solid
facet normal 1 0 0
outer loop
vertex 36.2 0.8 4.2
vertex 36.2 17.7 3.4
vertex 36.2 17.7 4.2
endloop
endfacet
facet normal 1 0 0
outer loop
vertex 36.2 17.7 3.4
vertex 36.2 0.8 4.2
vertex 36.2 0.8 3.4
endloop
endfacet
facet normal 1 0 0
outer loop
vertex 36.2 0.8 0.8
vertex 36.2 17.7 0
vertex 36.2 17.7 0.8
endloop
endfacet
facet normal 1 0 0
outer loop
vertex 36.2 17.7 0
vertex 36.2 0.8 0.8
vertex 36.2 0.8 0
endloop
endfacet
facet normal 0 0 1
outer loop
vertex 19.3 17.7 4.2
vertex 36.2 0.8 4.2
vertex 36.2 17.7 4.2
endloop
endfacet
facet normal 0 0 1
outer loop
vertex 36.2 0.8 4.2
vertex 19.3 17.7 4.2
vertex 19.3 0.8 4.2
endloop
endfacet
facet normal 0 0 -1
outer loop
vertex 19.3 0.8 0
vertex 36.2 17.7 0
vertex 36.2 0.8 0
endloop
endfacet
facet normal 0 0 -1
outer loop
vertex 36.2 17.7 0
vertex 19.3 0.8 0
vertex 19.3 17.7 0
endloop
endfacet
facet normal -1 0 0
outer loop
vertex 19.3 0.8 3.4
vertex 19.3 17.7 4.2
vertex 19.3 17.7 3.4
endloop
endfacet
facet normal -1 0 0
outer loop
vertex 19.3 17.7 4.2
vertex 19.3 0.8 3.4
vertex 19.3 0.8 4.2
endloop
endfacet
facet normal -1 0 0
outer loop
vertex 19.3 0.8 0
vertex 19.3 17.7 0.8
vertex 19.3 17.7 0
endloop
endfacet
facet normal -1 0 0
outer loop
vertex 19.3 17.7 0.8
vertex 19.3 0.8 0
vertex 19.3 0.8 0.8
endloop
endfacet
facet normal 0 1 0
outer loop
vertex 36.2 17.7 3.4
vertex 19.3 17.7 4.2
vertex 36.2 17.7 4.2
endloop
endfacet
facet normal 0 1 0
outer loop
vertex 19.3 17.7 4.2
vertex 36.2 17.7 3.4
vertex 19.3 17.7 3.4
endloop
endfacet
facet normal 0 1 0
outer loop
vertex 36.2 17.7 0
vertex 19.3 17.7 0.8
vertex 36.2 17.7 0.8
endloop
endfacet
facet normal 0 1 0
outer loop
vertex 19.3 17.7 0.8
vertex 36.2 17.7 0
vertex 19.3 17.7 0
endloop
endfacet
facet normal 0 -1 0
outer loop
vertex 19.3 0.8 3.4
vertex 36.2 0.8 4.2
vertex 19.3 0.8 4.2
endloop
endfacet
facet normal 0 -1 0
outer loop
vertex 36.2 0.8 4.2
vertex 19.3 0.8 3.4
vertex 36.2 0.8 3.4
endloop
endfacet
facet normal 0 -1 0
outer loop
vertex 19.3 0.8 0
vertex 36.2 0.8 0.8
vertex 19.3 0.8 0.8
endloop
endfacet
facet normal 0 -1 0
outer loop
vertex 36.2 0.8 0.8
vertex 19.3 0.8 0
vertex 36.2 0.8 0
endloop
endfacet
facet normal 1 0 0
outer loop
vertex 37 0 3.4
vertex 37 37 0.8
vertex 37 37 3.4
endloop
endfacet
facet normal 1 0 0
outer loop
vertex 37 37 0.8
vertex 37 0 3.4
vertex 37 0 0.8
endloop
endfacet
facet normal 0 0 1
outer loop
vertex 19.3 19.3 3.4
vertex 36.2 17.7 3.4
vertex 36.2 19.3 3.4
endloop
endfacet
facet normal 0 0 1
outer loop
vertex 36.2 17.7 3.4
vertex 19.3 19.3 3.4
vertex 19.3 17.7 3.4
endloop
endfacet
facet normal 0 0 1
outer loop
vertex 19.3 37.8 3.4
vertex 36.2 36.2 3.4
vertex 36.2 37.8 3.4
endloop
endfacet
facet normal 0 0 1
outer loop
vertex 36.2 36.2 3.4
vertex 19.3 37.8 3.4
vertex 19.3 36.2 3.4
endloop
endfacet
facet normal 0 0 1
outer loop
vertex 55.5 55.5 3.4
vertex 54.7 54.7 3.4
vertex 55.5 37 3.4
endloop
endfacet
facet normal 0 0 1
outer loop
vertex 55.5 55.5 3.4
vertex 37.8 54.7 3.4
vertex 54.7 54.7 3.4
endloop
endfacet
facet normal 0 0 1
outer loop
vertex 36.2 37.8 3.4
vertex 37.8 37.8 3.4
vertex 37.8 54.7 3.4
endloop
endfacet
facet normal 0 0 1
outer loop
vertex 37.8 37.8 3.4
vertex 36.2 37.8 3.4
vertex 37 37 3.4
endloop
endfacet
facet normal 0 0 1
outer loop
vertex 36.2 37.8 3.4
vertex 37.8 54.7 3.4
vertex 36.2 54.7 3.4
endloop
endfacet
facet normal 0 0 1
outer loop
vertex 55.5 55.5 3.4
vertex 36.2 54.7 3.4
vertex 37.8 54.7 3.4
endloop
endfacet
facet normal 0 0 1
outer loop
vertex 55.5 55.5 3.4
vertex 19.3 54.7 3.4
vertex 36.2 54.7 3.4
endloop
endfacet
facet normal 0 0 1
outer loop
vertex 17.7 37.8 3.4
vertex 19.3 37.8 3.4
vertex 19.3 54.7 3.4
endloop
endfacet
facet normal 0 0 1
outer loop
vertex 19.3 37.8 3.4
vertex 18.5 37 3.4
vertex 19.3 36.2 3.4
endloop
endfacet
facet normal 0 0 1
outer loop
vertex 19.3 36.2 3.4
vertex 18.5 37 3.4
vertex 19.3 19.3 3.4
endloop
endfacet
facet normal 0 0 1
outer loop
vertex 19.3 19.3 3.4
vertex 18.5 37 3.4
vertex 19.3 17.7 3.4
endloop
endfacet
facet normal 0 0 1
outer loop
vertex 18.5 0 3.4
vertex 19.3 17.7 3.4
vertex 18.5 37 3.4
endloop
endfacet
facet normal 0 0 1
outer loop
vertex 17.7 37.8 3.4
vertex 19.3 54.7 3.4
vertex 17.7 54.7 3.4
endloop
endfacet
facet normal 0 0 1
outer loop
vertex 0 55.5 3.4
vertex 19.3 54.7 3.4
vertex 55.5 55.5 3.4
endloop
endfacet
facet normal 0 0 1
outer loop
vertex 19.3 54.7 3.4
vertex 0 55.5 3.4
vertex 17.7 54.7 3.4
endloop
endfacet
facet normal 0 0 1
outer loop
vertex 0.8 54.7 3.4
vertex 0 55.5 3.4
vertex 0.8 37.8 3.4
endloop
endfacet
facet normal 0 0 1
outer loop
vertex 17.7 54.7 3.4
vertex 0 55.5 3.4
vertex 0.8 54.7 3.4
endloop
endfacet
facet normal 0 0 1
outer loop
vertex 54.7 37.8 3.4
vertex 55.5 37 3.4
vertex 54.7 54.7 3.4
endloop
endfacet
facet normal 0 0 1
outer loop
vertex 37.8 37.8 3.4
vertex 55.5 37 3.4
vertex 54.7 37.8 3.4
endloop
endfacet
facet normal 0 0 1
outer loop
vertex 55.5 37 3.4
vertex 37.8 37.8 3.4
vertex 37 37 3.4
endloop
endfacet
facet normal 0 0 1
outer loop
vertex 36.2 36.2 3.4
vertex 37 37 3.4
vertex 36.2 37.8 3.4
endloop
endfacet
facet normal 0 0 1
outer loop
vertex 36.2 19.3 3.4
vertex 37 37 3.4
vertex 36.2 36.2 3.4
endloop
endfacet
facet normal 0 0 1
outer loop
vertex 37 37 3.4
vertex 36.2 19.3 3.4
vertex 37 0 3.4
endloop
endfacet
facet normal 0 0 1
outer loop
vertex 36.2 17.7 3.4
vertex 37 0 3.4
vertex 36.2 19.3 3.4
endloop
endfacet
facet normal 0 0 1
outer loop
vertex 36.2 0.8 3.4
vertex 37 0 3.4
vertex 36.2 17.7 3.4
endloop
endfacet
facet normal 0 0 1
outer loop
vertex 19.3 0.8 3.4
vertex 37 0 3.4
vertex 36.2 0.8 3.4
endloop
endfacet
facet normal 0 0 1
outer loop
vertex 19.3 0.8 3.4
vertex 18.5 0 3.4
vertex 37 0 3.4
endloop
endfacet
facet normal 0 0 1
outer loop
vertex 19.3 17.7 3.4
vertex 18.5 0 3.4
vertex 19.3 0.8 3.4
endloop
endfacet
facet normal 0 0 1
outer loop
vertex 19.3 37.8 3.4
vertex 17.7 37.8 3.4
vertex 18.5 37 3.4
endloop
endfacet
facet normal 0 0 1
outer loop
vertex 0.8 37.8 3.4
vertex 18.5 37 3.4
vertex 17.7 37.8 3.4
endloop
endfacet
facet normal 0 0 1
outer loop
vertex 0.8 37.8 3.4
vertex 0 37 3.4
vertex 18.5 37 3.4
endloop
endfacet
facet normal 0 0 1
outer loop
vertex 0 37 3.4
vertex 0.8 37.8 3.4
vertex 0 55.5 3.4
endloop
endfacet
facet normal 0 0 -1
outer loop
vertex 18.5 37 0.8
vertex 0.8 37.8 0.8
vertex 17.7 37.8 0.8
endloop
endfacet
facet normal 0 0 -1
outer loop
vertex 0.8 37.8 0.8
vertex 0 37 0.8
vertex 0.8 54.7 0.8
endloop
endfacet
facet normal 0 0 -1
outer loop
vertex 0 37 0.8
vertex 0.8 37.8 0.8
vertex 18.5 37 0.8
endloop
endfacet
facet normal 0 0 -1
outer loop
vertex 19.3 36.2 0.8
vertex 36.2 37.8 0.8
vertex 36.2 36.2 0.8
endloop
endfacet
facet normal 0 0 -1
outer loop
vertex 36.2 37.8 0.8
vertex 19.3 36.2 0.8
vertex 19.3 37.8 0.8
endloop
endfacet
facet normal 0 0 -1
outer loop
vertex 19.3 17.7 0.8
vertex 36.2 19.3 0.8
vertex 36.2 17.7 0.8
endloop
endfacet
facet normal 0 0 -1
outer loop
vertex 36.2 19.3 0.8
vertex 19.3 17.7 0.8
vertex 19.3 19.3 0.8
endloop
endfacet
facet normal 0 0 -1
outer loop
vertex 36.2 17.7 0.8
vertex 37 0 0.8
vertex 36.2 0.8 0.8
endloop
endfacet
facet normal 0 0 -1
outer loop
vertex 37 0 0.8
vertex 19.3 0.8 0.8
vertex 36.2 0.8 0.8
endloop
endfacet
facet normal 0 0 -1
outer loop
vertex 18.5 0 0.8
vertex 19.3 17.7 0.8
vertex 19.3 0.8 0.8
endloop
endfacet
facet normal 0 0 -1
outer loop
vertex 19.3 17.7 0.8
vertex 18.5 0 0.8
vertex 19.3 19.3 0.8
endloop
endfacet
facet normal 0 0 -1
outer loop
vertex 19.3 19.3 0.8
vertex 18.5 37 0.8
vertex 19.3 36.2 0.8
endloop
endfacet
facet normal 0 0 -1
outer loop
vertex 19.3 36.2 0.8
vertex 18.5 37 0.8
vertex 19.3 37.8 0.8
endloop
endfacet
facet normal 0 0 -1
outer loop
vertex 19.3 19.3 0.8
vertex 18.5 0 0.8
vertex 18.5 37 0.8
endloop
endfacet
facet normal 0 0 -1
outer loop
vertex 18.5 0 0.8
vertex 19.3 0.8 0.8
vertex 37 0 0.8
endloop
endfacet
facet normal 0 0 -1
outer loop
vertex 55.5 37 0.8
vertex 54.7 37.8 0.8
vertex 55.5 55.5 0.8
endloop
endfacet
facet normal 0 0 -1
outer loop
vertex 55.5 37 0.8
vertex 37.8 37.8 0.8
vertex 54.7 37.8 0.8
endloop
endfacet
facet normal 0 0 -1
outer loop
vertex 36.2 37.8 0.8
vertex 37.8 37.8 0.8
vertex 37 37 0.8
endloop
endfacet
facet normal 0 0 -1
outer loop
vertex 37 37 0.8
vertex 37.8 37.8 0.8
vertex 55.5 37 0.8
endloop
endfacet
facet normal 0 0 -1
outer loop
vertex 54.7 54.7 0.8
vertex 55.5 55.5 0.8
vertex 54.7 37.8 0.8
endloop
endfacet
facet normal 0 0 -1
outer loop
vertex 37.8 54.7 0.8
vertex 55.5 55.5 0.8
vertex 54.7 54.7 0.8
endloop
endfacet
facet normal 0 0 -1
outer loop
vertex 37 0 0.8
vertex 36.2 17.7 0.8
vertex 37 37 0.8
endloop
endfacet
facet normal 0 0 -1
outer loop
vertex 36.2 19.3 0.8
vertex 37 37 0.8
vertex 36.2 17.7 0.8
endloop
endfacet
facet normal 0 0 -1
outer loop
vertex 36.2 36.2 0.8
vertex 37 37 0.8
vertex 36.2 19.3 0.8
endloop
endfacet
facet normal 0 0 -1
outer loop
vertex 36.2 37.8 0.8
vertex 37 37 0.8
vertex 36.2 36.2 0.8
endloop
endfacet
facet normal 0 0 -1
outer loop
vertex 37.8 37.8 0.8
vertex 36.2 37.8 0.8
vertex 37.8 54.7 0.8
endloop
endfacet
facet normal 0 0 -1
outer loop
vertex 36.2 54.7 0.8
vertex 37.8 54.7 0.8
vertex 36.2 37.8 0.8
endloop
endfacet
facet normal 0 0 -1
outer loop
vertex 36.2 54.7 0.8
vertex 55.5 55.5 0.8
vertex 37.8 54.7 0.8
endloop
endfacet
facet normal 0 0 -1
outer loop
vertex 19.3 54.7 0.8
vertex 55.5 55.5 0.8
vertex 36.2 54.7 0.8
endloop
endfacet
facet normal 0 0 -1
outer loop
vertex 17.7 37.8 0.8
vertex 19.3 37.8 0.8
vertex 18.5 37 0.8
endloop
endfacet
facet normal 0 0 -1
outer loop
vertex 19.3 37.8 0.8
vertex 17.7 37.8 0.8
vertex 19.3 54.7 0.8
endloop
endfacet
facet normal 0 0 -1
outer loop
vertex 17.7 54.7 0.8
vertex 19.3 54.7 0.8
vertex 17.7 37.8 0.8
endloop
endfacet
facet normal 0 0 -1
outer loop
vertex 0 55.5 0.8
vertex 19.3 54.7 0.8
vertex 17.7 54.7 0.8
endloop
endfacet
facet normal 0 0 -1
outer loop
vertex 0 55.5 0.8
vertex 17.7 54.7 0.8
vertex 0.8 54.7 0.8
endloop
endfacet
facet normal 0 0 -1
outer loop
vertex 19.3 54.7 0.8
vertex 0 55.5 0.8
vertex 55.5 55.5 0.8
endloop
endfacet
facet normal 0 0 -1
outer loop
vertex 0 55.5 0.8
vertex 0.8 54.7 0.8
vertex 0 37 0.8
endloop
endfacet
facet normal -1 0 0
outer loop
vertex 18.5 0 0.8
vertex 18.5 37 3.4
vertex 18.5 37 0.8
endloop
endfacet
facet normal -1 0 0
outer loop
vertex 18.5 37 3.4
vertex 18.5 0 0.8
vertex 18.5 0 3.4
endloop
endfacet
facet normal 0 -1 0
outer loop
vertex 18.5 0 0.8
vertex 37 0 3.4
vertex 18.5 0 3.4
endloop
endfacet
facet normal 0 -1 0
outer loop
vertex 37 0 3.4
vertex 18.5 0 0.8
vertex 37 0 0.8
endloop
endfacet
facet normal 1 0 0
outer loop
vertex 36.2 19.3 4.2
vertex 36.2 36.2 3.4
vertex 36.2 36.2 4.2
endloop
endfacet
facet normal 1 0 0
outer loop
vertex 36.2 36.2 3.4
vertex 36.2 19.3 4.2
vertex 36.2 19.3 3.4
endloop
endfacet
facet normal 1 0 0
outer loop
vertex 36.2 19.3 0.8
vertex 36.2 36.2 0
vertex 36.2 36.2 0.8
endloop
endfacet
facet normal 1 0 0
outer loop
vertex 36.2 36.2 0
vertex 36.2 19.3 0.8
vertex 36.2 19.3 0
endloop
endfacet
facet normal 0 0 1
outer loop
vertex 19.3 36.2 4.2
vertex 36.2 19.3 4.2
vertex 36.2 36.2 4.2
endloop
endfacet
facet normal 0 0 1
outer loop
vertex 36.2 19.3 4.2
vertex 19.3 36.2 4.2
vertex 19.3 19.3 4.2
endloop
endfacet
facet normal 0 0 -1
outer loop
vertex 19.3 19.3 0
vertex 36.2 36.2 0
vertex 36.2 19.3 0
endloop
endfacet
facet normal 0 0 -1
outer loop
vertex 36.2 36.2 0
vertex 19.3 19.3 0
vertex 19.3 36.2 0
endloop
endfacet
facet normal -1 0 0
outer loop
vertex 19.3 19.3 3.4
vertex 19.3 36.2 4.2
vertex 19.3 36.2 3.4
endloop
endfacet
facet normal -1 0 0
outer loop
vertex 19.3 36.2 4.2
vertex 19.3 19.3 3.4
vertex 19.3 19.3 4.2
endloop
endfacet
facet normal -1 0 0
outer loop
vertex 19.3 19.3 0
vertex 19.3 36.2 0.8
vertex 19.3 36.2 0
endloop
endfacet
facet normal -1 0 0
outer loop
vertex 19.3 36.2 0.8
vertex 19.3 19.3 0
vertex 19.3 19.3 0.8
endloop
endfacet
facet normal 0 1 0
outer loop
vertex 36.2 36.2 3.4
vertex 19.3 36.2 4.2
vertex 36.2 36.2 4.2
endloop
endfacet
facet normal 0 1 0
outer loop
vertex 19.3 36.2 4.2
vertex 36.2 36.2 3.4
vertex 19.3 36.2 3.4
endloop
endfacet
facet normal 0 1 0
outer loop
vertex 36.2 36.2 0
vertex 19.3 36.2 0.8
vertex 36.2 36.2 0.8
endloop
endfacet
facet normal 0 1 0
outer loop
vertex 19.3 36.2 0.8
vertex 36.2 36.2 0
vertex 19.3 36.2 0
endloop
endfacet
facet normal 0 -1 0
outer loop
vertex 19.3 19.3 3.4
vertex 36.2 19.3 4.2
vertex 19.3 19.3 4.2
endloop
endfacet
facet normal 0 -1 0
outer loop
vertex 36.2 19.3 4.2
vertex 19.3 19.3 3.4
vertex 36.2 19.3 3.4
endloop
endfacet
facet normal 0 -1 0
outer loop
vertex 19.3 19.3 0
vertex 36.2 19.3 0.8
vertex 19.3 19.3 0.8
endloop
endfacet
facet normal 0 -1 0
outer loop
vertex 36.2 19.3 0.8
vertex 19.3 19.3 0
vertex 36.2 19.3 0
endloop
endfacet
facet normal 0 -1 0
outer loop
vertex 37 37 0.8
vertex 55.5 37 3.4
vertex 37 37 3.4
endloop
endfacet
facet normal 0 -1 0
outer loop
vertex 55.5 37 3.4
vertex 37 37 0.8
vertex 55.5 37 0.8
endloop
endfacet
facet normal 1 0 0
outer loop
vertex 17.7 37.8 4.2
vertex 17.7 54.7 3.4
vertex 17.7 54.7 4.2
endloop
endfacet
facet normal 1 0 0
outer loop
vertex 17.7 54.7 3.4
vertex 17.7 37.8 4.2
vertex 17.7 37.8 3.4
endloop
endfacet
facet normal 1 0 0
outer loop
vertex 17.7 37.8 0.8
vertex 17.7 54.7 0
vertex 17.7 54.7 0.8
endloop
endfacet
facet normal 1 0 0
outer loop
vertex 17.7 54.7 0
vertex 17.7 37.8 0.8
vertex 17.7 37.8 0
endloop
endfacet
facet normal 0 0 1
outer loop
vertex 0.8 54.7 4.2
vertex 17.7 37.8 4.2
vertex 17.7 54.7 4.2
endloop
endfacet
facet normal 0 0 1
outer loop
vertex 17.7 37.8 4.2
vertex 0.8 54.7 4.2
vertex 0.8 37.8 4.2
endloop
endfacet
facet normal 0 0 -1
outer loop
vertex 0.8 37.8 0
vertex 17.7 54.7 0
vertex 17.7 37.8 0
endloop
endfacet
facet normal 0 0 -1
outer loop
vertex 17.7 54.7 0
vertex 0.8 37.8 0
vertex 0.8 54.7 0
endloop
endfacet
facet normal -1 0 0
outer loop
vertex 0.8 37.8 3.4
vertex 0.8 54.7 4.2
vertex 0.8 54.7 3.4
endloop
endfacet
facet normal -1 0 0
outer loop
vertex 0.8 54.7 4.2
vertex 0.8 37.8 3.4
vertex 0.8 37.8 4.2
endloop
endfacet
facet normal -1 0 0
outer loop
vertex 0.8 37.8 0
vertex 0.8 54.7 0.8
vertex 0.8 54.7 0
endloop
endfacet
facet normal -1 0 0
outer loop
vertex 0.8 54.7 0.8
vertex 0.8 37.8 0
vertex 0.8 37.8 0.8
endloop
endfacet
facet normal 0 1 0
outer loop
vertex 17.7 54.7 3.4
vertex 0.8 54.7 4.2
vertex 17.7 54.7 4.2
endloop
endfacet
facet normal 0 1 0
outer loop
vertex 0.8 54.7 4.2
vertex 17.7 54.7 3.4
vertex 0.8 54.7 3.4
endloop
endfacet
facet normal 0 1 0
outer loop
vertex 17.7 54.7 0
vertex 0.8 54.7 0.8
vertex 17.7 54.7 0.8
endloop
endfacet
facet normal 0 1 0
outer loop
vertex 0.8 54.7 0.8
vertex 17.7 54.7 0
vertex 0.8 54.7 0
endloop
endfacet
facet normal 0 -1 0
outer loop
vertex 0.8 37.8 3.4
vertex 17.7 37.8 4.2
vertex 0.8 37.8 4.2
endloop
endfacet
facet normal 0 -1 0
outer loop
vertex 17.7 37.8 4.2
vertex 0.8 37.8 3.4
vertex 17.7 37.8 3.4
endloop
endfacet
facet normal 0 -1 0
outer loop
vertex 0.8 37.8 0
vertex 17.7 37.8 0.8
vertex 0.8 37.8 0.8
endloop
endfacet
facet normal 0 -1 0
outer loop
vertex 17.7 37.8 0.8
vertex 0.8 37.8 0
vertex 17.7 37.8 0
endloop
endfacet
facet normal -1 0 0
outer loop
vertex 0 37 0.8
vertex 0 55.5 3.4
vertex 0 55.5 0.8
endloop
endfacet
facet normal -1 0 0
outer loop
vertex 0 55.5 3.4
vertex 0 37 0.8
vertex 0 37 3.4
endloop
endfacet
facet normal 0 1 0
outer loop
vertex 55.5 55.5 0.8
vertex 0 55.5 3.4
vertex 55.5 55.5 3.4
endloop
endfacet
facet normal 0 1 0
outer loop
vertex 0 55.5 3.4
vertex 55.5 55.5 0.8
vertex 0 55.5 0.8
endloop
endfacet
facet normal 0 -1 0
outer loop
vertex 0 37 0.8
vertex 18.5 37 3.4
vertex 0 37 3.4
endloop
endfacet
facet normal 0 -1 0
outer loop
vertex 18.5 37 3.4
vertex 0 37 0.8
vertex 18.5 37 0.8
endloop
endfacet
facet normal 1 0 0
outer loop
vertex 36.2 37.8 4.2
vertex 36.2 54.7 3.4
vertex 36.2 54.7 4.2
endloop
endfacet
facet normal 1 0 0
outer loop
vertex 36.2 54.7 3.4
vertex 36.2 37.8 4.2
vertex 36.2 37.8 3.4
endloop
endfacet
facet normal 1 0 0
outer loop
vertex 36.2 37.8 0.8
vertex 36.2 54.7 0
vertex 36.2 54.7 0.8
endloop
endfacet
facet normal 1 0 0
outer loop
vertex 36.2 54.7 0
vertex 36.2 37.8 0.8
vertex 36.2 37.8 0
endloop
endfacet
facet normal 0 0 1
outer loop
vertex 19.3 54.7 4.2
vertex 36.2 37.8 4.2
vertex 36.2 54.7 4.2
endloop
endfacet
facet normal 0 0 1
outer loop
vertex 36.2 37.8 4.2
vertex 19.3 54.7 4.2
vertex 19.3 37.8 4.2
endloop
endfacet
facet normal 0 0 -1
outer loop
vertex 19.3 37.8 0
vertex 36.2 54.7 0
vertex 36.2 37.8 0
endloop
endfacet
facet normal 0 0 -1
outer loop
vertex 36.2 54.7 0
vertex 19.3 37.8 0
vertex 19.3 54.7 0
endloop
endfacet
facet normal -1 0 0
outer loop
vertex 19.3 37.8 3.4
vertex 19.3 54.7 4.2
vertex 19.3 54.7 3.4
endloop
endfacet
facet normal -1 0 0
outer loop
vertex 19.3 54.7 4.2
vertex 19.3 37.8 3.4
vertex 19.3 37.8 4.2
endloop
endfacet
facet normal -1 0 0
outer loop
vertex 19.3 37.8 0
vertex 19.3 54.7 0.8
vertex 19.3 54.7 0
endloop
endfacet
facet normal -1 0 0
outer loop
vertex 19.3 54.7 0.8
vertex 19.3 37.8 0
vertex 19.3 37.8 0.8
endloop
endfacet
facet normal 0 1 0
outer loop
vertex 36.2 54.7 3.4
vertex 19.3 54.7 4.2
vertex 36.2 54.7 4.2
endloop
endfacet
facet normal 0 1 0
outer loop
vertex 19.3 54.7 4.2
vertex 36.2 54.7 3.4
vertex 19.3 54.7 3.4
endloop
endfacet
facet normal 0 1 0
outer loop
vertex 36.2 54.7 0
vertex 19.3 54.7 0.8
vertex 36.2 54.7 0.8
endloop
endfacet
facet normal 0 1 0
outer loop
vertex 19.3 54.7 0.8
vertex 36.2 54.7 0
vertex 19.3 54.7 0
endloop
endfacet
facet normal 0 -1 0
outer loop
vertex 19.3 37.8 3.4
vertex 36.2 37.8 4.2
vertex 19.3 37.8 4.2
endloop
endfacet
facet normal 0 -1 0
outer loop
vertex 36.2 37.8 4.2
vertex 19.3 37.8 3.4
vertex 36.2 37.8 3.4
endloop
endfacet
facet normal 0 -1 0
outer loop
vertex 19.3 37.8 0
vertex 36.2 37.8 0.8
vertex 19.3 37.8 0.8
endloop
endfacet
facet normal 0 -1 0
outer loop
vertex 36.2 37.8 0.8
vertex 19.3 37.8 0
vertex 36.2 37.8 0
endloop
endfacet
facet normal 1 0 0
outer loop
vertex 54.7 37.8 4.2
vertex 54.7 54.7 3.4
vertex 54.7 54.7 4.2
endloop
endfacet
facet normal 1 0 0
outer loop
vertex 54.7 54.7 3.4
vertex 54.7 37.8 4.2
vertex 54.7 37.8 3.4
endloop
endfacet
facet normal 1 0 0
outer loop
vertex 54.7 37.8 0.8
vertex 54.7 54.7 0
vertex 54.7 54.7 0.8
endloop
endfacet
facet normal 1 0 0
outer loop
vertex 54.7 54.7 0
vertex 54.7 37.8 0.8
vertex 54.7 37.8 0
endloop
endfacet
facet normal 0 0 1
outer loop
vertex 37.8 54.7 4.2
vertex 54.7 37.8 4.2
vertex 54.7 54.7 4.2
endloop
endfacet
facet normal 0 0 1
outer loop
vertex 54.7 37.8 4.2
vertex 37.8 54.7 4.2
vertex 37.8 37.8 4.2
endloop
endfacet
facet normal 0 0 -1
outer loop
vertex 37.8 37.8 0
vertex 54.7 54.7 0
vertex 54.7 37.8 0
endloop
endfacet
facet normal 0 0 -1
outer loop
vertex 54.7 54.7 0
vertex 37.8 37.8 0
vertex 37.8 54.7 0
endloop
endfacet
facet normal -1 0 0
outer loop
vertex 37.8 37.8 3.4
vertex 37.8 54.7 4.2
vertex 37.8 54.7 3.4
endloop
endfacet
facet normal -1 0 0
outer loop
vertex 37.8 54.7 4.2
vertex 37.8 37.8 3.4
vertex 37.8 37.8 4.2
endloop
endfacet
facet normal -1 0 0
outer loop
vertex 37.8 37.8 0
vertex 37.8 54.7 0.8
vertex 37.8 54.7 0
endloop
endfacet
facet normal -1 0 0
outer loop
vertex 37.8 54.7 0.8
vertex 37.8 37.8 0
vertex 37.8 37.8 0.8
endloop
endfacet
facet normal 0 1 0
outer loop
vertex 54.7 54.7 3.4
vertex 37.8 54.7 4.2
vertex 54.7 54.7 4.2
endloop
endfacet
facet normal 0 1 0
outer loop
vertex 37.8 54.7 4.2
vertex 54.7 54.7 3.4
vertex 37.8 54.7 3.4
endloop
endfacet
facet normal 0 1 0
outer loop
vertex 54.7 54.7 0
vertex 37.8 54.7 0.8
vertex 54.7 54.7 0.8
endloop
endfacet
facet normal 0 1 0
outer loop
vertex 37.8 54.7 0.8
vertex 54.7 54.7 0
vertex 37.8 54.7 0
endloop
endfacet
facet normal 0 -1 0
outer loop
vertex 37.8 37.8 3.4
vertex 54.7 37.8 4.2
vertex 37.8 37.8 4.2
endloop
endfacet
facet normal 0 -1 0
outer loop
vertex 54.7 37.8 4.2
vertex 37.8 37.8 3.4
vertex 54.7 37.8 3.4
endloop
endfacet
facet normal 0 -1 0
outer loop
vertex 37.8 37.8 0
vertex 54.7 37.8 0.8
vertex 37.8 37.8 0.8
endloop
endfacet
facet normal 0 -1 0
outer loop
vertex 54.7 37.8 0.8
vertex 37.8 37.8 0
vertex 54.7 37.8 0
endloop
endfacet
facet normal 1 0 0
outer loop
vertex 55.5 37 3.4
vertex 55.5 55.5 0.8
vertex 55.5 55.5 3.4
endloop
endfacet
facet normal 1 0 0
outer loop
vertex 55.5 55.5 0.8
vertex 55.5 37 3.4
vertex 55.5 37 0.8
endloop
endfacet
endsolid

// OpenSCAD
// Side of one square.
width = 18.5;
// Height of the peices.
height = 4.2;
// Half the width of the grooves.
hg_width = 0.8;

// One block in the blokus peices.
module blokus_block(width=width, height=height, hg_width=hg_width) {
    translate([hg_width, hg_width, 0]) 
    cube([width-hg_width*2, width-hg_width*2, height]);
    translate([0, 0, hg_width]) 
    cube([width, width, height - hg_width*2]);
}

// A Blokus peice created by a matrix with ones where the blocks are supposed to be.
module blokus_shape(shape) {
    b_height = len(shape);
    b_width = len(shape[0]);
    for(i = [0:b_height], j = [0:b_width]) {
        if(shape[i][j] == 1) {
            translate([width * j, width * i, 0])
            blokus_block(width,height);
        }
    }
}


shape_array = [[0,1,0],
               [0,1,0],
               [1,1,1]];

blokus_shape(shape_array);
